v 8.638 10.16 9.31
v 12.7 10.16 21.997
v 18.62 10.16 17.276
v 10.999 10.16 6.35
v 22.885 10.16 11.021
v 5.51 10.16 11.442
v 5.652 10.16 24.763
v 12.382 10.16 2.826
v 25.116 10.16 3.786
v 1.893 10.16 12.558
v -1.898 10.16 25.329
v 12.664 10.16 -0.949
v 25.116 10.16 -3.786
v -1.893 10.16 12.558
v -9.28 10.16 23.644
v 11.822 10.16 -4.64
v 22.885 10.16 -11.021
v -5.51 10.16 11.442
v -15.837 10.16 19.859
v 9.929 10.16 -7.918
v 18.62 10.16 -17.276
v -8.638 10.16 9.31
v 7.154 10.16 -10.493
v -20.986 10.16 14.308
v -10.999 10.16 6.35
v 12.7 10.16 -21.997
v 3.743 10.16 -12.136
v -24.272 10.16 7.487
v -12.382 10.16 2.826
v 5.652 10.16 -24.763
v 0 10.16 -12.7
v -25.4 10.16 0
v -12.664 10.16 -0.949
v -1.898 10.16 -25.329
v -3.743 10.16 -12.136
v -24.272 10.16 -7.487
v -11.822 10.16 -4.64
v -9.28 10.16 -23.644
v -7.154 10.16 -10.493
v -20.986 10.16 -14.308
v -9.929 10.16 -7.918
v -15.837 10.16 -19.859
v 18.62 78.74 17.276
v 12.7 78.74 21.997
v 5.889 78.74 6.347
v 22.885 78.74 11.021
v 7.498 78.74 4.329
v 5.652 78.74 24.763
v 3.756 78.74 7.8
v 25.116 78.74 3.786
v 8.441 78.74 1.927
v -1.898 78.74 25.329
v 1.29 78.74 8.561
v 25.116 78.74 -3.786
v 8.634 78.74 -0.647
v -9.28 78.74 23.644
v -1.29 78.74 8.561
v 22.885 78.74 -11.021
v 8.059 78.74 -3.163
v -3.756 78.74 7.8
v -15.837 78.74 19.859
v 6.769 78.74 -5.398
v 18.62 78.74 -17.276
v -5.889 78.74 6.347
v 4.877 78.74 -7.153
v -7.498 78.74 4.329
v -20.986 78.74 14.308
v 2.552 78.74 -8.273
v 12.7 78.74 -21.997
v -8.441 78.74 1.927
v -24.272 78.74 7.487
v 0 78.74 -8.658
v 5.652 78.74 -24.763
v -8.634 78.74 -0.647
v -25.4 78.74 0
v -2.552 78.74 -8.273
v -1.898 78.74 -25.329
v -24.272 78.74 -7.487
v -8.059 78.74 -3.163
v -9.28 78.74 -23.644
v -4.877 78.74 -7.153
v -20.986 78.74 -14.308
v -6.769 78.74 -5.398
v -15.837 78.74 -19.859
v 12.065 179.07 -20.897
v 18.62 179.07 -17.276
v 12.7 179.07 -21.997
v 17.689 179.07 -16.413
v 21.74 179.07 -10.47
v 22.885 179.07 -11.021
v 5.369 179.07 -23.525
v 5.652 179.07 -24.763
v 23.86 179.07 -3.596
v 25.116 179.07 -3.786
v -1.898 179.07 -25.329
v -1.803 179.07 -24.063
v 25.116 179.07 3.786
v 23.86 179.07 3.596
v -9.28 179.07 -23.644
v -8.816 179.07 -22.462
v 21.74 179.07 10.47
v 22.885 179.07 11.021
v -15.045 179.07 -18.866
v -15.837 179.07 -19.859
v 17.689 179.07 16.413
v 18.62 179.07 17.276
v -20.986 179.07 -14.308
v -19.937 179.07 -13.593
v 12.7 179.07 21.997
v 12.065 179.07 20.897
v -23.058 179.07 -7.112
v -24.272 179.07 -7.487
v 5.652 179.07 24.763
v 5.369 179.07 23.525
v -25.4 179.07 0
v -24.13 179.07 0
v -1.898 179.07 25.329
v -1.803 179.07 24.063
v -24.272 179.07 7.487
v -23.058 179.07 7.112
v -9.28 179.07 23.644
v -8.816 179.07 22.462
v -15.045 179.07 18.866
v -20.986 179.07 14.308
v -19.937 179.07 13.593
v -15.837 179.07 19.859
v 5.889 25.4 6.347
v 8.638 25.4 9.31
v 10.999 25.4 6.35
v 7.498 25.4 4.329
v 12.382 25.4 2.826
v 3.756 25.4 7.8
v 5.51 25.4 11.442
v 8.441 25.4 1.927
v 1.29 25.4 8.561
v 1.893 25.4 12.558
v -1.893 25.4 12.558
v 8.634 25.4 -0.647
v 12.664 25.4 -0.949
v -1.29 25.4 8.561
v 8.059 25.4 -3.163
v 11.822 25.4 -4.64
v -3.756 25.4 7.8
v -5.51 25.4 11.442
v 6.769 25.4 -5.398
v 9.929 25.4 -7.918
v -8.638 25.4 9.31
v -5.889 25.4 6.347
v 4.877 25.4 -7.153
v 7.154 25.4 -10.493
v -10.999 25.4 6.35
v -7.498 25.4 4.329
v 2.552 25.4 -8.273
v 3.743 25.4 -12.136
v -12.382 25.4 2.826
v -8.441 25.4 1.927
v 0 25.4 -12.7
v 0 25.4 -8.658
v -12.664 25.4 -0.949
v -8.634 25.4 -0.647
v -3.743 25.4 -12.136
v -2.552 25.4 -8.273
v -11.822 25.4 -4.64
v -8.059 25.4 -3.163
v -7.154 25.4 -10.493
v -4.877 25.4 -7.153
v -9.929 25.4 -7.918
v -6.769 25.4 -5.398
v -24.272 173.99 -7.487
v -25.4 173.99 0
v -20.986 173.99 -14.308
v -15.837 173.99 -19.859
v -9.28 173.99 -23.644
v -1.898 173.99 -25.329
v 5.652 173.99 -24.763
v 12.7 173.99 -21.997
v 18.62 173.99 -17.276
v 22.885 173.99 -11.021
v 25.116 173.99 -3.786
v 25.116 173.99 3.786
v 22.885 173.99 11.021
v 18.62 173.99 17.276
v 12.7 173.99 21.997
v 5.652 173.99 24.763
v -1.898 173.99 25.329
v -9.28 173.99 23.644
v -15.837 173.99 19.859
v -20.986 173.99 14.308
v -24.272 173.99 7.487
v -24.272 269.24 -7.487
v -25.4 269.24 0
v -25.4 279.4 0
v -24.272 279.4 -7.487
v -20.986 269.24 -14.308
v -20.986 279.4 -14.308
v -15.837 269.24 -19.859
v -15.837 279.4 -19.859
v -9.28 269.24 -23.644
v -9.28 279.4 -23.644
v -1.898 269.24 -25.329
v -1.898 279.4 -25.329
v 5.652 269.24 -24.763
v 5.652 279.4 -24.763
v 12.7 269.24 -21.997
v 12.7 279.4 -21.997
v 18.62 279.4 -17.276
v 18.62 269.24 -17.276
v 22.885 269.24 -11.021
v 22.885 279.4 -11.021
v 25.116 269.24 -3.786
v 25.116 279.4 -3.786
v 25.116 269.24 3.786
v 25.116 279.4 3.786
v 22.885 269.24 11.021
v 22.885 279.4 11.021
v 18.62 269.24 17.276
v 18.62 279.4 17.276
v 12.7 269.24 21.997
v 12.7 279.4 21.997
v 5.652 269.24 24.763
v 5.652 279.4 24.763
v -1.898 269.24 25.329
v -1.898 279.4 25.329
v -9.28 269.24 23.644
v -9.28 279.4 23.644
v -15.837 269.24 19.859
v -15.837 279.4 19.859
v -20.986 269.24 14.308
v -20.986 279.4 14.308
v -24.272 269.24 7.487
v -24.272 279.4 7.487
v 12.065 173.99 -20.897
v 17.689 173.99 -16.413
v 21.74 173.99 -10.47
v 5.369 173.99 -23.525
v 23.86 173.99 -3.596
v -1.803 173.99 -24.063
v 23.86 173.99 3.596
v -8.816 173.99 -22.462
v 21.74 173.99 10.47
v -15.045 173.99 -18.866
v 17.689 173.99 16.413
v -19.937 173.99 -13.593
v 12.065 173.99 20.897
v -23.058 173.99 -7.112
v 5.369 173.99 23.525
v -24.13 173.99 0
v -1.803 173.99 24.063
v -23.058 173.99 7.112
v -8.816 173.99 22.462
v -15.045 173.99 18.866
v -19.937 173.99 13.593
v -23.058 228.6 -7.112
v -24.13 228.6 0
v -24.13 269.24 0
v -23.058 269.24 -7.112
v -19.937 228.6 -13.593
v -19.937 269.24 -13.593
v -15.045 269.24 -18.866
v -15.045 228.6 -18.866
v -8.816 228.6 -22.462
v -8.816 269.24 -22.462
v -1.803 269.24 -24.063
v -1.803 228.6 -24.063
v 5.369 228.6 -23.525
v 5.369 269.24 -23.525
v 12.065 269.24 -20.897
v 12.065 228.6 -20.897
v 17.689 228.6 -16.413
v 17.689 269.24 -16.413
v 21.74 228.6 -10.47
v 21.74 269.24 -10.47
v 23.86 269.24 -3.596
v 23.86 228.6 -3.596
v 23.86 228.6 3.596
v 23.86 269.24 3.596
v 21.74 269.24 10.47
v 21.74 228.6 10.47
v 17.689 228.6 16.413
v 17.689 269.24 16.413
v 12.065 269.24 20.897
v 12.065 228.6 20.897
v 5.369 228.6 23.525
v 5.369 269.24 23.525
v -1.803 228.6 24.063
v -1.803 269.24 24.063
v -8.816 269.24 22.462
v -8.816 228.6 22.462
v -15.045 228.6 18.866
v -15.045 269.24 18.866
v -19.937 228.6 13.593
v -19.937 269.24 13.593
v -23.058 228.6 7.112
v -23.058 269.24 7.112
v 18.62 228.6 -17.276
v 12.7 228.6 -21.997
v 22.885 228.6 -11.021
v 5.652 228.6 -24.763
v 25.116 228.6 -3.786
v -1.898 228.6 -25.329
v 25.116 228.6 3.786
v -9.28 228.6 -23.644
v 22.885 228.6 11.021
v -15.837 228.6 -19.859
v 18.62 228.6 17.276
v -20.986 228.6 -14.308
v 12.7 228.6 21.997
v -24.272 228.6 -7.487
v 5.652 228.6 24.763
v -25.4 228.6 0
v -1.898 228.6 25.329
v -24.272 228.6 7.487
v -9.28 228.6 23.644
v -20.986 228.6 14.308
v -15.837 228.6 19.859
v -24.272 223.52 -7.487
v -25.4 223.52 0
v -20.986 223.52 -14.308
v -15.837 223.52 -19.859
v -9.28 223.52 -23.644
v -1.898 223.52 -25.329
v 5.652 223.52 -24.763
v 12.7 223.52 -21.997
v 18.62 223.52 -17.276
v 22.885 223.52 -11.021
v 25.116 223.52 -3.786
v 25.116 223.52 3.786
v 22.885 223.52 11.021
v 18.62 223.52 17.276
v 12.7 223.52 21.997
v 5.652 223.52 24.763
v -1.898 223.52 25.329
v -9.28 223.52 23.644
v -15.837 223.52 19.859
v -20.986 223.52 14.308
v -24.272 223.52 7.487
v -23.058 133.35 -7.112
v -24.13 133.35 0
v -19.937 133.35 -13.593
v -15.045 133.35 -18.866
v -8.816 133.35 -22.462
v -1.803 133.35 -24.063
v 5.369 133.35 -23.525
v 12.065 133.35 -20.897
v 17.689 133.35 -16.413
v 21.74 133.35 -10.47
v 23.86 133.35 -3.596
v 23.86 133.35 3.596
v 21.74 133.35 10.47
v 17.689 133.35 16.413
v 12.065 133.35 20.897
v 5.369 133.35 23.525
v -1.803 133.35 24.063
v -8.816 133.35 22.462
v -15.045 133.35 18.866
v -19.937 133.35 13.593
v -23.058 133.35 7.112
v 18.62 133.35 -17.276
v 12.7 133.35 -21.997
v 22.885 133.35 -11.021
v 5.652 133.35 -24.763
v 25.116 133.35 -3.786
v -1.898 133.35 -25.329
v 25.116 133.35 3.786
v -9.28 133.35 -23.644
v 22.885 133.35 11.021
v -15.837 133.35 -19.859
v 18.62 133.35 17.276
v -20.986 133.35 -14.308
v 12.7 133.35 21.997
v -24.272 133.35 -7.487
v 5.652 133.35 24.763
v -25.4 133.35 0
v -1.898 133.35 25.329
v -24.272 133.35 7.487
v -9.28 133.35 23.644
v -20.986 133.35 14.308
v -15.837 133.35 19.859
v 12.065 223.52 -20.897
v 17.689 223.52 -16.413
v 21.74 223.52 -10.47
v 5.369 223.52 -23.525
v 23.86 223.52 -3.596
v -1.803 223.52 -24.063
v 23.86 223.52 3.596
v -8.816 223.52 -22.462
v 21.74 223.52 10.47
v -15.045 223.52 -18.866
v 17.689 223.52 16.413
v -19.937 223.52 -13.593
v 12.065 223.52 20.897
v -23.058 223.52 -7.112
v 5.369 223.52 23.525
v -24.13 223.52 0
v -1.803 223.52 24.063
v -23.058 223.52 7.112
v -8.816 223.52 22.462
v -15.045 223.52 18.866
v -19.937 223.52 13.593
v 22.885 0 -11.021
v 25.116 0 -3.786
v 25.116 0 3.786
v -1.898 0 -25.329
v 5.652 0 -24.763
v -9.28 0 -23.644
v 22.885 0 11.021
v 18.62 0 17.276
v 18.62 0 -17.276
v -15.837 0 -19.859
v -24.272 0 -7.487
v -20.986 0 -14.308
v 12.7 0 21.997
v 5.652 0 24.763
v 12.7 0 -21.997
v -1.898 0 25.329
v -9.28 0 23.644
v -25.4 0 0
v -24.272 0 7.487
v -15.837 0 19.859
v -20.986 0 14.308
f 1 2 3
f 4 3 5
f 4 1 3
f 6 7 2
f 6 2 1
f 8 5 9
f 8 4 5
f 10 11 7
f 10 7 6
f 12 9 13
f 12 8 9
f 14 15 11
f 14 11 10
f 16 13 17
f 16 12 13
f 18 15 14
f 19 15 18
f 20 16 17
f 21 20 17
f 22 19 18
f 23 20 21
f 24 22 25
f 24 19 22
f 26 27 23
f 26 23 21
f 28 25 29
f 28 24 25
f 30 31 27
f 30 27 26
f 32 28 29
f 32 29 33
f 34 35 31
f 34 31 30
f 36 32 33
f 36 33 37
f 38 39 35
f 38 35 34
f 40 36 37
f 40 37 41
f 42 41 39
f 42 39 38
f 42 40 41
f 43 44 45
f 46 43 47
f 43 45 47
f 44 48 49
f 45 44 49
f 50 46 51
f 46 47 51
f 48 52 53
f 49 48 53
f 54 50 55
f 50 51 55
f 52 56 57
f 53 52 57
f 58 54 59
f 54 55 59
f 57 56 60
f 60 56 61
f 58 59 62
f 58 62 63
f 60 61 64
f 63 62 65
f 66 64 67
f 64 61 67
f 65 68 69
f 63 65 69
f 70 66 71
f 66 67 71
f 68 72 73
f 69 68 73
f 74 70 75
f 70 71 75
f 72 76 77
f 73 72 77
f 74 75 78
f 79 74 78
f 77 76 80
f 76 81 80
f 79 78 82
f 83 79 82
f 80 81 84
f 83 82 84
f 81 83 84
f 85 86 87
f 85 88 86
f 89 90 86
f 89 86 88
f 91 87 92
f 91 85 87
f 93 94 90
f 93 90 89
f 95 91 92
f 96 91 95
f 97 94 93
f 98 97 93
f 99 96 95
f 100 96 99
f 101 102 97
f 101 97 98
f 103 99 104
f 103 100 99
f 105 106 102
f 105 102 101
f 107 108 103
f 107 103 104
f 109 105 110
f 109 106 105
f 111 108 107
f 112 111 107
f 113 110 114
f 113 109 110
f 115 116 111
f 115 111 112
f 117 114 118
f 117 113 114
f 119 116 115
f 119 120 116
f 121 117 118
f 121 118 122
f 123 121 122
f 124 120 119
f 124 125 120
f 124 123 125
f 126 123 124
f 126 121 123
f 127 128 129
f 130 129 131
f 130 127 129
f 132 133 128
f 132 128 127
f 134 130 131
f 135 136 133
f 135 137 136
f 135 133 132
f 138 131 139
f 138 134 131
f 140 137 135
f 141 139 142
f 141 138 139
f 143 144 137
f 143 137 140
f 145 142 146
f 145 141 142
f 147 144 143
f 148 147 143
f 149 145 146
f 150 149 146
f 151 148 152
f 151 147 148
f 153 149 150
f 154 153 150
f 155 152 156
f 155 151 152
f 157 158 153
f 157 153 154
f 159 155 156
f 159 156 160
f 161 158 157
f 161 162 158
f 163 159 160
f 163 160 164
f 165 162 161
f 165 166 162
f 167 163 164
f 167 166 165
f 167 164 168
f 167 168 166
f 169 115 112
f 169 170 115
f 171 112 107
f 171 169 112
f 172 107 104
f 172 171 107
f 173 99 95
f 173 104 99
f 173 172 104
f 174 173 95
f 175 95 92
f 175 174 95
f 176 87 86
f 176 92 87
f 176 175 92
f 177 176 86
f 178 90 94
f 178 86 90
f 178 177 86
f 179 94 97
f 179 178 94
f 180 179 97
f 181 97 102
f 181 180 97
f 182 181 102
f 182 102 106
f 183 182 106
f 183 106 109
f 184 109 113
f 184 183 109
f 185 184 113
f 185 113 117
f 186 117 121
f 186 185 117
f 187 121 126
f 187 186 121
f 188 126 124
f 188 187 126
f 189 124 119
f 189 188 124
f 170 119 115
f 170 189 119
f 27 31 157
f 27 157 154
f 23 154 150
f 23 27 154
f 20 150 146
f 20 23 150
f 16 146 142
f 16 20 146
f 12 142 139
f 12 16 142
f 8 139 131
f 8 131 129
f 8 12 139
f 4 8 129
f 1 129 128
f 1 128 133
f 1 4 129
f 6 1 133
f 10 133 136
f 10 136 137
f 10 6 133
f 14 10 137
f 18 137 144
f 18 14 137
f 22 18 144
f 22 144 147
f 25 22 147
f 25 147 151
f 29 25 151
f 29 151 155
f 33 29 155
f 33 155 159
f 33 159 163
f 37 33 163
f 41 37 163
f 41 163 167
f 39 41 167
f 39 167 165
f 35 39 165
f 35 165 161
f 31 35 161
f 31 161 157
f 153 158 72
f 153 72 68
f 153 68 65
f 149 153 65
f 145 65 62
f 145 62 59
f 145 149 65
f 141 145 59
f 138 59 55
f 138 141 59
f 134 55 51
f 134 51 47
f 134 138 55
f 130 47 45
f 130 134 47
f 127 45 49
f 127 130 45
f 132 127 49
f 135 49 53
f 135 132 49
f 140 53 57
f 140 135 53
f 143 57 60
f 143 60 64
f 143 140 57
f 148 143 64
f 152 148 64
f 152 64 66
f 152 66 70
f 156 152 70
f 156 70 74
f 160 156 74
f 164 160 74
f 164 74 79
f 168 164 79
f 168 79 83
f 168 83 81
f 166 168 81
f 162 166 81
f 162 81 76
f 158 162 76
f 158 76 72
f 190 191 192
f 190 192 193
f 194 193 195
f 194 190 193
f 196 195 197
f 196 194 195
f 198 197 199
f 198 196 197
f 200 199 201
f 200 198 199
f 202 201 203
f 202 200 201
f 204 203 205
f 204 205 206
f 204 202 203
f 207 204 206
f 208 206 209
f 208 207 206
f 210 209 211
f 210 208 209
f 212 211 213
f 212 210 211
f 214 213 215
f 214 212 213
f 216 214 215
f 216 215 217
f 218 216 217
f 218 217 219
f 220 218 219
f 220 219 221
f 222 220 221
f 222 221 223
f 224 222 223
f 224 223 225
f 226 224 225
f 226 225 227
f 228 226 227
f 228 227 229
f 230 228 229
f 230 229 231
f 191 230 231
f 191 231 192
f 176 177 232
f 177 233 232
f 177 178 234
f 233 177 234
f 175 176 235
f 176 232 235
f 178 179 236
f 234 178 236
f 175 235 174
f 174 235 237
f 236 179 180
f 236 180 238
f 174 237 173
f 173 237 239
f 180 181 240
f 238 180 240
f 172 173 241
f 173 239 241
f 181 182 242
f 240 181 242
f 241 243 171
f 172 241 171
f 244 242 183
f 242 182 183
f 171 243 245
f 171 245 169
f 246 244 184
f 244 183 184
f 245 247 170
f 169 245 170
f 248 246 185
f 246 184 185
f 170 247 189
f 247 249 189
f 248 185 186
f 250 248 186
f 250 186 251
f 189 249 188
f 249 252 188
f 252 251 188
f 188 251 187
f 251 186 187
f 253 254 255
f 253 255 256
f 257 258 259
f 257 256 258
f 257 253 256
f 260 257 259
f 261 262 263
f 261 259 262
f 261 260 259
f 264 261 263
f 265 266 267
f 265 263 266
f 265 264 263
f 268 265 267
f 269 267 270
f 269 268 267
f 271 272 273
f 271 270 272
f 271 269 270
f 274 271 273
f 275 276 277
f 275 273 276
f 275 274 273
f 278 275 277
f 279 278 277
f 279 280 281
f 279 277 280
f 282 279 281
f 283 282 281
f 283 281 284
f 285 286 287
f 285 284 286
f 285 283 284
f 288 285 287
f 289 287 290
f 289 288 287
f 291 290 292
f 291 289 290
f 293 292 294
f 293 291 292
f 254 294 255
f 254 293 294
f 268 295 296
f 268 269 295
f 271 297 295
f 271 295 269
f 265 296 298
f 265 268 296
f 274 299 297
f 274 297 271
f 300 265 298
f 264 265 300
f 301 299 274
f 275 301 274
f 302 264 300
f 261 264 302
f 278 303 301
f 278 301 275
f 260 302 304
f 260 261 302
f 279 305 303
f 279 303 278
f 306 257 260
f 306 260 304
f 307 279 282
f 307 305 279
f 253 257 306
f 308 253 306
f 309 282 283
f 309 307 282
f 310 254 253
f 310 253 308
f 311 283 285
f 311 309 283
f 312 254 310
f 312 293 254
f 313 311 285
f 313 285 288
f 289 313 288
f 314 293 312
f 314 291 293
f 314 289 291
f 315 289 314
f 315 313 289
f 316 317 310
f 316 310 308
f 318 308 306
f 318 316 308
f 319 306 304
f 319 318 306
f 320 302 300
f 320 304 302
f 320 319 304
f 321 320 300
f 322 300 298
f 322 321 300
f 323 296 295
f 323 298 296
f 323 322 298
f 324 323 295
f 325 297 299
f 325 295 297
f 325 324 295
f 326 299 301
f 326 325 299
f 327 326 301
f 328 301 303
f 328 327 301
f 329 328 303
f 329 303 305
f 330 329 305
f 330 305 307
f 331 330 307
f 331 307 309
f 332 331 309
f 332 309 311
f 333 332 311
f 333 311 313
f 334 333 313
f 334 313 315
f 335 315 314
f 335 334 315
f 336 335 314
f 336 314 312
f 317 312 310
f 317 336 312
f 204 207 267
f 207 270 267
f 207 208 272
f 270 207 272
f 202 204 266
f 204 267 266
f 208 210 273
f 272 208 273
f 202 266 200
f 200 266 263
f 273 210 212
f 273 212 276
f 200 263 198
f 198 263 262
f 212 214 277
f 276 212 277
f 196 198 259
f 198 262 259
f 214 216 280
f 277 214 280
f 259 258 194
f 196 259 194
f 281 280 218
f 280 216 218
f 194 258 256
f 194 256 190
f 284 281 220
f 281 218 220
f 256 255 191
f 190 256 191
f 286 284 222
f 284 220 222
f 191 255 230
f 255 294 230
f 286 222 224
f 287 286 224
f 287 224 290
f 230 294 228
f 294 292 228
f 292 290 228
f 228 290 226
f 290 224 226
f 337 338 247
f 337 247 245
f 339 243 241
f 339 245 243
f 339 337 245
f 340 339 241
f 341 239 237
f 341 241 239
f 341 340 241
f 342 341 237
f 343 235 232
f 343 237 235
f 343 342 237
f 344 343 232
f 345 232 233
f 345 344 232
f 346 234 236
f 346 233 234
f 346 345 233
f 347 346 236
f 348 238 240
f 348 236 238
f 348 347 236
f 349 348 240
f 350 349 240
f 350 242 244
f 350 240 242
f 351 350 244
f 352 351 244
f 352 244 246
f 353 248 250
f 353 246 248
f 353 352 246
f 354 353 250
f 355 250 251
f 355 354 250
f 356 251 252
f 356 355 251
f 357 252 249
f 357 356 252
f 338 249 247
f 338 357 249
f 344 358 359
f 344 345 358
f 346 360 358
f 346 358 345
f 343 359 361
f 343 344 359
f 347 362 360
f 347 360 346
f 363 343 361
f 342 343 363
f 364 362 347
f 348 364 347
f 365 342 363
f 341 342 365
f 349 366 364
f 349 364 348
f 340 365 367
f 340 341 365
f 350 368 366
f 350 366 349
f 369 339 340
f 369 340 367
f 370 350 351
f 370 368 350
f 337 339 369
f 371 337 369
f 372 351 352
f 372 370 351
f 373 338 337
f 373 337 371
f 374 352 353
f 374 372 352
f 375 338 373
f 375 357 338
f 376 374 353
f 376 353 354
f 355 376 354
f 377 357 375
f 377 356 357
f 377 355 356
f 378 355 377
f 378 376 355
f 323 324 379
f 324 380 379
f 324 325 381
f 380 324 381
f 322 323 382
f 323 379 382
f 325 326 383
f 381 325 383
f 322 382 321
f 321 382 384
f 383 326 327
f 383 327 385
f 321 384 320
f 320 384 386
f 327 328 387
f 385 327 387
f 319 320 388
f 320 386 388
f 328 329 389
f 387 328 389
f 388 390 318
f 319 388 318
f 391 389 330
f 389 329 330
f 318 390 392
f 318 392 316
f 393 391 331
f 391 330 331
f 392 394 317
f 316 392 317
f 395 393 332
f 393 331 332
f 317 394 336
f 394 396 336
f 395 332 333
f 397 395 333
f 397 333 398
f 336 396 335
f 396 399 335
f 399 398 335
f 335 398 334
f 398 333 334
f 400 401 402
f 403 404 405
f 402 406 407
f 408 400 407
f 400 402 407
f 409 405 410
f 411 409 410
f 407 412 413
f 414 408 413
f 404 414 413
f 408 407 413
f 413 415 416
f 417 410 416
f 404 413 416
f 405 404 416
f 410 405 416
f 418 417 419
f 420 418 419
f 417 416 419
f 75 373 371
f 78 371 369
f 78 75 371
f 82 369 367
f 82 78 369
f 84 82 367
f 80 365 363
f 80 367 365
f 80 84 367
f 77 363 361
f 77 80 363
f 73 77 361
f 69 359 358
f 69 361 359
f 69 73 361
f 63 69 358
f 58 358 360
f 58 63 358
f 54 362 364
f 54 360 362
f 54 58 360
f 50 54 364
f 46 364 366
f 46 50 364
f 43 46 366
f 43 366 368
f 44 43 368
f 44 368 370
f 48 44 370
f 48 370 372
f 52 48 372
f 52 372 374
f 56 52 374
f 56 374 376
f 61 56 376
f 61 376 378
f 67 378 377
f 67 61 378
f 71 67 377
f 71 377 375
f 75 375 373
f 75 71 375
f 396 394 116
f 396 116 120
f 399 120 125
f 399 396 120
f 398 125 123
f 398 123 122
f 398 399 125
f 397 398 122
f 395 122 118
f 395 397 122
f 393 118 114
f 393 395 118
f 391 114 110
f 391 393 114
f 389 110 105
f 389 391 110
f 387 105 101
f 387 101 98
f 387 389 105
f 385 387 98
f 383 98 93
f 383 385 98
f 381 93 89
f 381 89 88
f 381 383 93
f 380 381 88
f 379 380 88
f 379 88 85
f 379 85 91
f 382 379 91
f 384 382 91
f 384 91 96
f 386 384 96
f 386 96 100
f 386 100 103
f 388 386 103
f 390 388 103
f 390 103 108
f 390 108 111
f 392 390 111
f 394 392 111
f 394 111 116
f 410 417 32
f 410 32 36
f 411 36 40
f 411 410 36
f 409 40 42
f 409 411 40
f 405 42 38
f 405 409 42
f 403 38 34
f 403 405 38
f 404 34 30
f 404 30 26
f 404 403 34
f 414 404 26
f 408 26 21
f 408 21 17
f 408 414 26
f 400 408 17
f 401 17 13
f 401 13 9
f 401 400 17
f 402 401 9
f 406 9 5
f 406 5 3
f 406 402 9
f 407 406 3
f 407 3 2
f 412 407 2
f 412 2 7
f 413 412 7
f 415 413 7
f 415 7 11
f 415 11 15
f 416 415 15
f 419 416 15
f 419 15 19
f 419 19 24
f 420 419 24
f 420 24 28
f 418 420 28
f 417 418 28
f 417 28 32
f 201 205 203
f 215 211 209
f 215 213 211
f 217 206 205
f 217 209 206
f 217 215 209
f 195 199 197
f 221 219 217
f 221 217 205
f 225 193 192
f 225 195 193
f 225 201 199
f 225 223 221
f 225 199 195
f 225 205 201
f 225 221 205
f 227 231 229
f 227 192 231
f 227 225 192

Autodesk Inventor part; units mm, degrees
ref_plane "YZ Plane" through (0, 0, 0) normal (1, 0, 0) x (0, 1, 0)
ref_plane "XZ Plane" through (0, 0, 0) normal (0, 1, 0) x (-1, 0, 0)
ref_plane "XY Plane" through (0, 0, 0) normal (0, 0, 1) x (1, 0, 0)
sketch "Sketch1" plane through (0, 0, 0) normal (0, 1, 0) x (-1, 0, 0)
  line L0 (0, -35.56) -> (0, 35.56) projected
  line L1 (-35.56, 0) -> (35.56, 0) projected
  circle A0 centre (0, 0) radius 25.4
  dimension "d0" = 50.8
extrude "Extrusion1" add sketch "Sketch1" along normal blind 279.4
sketch "Sketch2" plane through (0, 0, 0) normal (1, 0, 0) x (0, 1, 0)
  line L0 (279.4, -25.4) -> (279.4, 25.4) projected
  line L1 (0, 25.4) -> (0, -25.4) projected
  line L2 (0, -25.4) -> (279.4, -25.4) projected
  line L3 (0, 25.4) -> (10.16, 25.4)
  line L4 (10.16, 25.4) -> (10.16, -25.4)
  line L5 (10.16, -25.4) -> (0, -25.4)
  line L6 (0, -25.4) -> (0, 25.4)
  line L7 (-5.08, 12.7) -> (25.4, 12.7)
  line L8 (25.4, 12.7) -> (25.4, -12.7)
  line L9 (25.4, -12.7) -> (-5.08, -12.7)
  line L10 (-5.08, -12.7) -> (-5.08, 12.7)
  line L11 (-5.08, 12.7) -> (25.4, -12.7) construction
  line L12 (25.4, 12.7) -> (-5.08, -12.7) construction
  line L13 (-27.94, 8.6578) -> (78.74, 8.6578)
  line L14 (78.74, 8.6578) -> (78.74, -8.6578)
  line L15 (78.74, -8.6578) -> (-27.94, -8.6578)
  line L16 (-27.94, -8.6578) -> (-27.94, 8.6578)
  line L17 (-27.94, 8.6578) -> (78.74, -8.6578) construction
  line L18 (78.74, 8.6578) -> (-27.94, -8.6578) construction
  line L19 (78.74, 25.4) -> (0, 25.4)
  line L20 (0, 25.4) -> (0, -25.4)
  line L21 (0, -25.4) -> (78.74, -25.4)
  line L22 (78.74, -25.4) -> (78.74, 25.4)
  line L23 (25.4, 8.6578) -> (78.74, 8.6578)
  line L24 (78.74, 8.6578) -> (78.74, 25.4)
  line L25 (78.74, 25.4) -> (25.4, 25.4)
  line L26 (25.4, 25.4) -> (25.4, 8.6578)
  line L27 (10.16, 12.7) -> (25.4, 12.7)
  line L28 (25.4, 12.7) -> (25.4, 25.4)
  line L29 (25.4, 25.4) -> (10.16, 25.4)
  line L30 (10.16, 25.4) -> (10.16, 12.7)
  line L31 (10.16, -12.7) -> (25.4, -12.7)
  line L32 (25.4, -12.7) -> (25.4, -25.4)
  line L33 (25.4, -25.4) -> (10.16, -25.4)
  line L34 (10.16, -25.4) -> (10.16, -12.7)
  line L35 (25.4, -8.6578) -> (78.74, -8.6578)
  line L36 (78.74, -8.6578) -> (78.74, -25.4)
  line L37 (78.74, -25.4) -> (25.4, -25.4)
  line L38 (25.4, -25.4) -> (25.4, -8.6578)
  line L39 (-89.408, 0) -> (340.868, 0) projected
  point P0 (0, 0)
  point P1 (10.16, 0)
  point P2 (25.4, 0)
  dimension "d3" = 10.16
  dimension "d4" = 30.48
  dimension "d5" = 25.4
  dimension "d6" = 106.68
revolve "Revolution1" cut sketch "Sketch2" angle 360 about axis through (0, -10, 0) along (0, 1, 0) contours L2 L32 L8 L15 L22 | L2 L4 L9 L32 | L13 L8 L26 L19 L22 | L7 L4 L19 L26
sketch "Sketch3" plane through (0, 0, 0) normal (0, 0, 1) x (1, 0, 0)
  line L0 (25.4, 78.74) -> (-25.4, 78.74) projected
  line L1 (25.4, 78.74) -> (-25.4, 78.74) projected
  line L2 (25.4, 279.4) -> (-25.4, 279.4) projected
  line L3 (-25.4, 78.74) -> (25.4, 78.74)
  line L4 (25.4, 78.74) -> (25.4, 279.4)
  line L5 (25.4, 279.4) -> (-25.4, 279.4)
  line L6 (-25.4, 279.4) -> (-25.4, 78.74)
  line L7 (-25.4, 78.74) -> (-25.4, 279.4) projected
  line L8 (25.4, 279.4) -> (-25.4, 279.4)
  line L9 (-25.4, 279.4) -> (-25.4, 269.24)
  line L10 (-25.4, 269.24) -> (25.4, 269.24)
  line L11 (25.4, 269.24) -> (25.4, 279.4)
  line L12 (25.4, 78.74) -> (25.4, 279.4) projected
  line L13 (-25.4, 269.24) -> (25.4, 269.24)
  line L14 (25.4, 269.24) -> (25.4, 228.6)
  line L15 (25.4, 228.6) -> (-25.4, 228.6)
  line L16 (-25.4, 228.6) -> (-25.4, 269.24)
  line L17 (25.4, 228.6) -> (-25.4, 228.6)
  line L18 (-25.4, 228.6) -> (-25.4, 223.52)
  line L19 (-25.4, 223.52) -> (25.4, 223.52)
  line L20 (25.4, 223.52) -> (25.4, 228.6)
  line L21 (-25.4, 223.52) -> (15.24, 223.52)
  line L22 (15.24, 223.52) -> (15.24, 179.07)
  line L23 (15.24, 179.07) -> (-25.4, 179.07)
  line L24 (-25.4, 179.07) -> (-25.4, 223.52)
  line L25 (25.4, 179.07) -> (-25.4, 179.07)
  line L26 (-25.4, 179.07) -> (-25.4, 173.99)
  line L27 (-25.4, 173.99) -> (25.4, 173.99)
  line L28 (25.4, 173.99) -> (25.4, 179.07)
  line L29 (-25.4, 173.99) -> (25.4, 173.99)
  line L30 (25.4, 173.99) -> (25.4, 133.35)
  line L31 (25.4, 133.35) -> (-25.4, 133.35)
  line L32 (-25.4, 133.35) -> (-25.4, 173.99)
  line L33 (0, 269.24) -> (-24.13, 269.24)
  line L34 (-24.13, 269.24) -> (-24.13, 228.6)
  line L35 (-24.13, 228.6) -> (0, 228.6)
  line L36 (0, 228.6) -> (0, 269.24)
  line L37 (-25.4, 228.6) -> (-24.13, 228.6)
  line L38 (-24.13, 228.6) -> (-24.13, 269.24)
  line L39 (-24.13, 269.24) -> (-25.4, 269.24)
  line L40 (-25.4, 269.24) -> (-25.4, 228.6)
  line L41 (-25.4, 179.07) -> (-24.13, 179.07)
  line L42 (-24.13, 179.07) -> (-24.13, 223.52)
  line L43 (-24.13, 223.52) -> (-25.4, 223.52)
  line L44 (-25.4, 223.52) -> (-25.4, 179.07)
  line L45 (-25.4, 173.99) -> (-24.13, 173.99)
  line L46 (-24.13, 173.99) -> (-24.13, 133.35)
  line L47 (-24.13, 133.35) -> (-25.4, 133.35)
  line L48 (-25.4, 133.35) -> (-25.4, 173.99)
  point P0 (0, 0)
  dimension "d8" = 10.16
  dimension "d9" = 40.64
  dimension "d10" = 5.08
  dimension "d11" = 40.64
  dimension "d12" = 5.08
  dimension "d13" = 40.64
  dimension "d14" = 24.13
  dimension "d15" = 1.27
  dimension "d16" = 1.27
  dimension "d17" = 40.64
revolve "Revolution2" cut sketch "Sketch3" angle 360 about axis through (0, 228.6, 0) along (0, 1, 0) contours L6 L27 L46 L31 | L6 L19 L42 L23 | L6 L10 L34 L15
properties part number "TowerLight" material "UHMW, White"
